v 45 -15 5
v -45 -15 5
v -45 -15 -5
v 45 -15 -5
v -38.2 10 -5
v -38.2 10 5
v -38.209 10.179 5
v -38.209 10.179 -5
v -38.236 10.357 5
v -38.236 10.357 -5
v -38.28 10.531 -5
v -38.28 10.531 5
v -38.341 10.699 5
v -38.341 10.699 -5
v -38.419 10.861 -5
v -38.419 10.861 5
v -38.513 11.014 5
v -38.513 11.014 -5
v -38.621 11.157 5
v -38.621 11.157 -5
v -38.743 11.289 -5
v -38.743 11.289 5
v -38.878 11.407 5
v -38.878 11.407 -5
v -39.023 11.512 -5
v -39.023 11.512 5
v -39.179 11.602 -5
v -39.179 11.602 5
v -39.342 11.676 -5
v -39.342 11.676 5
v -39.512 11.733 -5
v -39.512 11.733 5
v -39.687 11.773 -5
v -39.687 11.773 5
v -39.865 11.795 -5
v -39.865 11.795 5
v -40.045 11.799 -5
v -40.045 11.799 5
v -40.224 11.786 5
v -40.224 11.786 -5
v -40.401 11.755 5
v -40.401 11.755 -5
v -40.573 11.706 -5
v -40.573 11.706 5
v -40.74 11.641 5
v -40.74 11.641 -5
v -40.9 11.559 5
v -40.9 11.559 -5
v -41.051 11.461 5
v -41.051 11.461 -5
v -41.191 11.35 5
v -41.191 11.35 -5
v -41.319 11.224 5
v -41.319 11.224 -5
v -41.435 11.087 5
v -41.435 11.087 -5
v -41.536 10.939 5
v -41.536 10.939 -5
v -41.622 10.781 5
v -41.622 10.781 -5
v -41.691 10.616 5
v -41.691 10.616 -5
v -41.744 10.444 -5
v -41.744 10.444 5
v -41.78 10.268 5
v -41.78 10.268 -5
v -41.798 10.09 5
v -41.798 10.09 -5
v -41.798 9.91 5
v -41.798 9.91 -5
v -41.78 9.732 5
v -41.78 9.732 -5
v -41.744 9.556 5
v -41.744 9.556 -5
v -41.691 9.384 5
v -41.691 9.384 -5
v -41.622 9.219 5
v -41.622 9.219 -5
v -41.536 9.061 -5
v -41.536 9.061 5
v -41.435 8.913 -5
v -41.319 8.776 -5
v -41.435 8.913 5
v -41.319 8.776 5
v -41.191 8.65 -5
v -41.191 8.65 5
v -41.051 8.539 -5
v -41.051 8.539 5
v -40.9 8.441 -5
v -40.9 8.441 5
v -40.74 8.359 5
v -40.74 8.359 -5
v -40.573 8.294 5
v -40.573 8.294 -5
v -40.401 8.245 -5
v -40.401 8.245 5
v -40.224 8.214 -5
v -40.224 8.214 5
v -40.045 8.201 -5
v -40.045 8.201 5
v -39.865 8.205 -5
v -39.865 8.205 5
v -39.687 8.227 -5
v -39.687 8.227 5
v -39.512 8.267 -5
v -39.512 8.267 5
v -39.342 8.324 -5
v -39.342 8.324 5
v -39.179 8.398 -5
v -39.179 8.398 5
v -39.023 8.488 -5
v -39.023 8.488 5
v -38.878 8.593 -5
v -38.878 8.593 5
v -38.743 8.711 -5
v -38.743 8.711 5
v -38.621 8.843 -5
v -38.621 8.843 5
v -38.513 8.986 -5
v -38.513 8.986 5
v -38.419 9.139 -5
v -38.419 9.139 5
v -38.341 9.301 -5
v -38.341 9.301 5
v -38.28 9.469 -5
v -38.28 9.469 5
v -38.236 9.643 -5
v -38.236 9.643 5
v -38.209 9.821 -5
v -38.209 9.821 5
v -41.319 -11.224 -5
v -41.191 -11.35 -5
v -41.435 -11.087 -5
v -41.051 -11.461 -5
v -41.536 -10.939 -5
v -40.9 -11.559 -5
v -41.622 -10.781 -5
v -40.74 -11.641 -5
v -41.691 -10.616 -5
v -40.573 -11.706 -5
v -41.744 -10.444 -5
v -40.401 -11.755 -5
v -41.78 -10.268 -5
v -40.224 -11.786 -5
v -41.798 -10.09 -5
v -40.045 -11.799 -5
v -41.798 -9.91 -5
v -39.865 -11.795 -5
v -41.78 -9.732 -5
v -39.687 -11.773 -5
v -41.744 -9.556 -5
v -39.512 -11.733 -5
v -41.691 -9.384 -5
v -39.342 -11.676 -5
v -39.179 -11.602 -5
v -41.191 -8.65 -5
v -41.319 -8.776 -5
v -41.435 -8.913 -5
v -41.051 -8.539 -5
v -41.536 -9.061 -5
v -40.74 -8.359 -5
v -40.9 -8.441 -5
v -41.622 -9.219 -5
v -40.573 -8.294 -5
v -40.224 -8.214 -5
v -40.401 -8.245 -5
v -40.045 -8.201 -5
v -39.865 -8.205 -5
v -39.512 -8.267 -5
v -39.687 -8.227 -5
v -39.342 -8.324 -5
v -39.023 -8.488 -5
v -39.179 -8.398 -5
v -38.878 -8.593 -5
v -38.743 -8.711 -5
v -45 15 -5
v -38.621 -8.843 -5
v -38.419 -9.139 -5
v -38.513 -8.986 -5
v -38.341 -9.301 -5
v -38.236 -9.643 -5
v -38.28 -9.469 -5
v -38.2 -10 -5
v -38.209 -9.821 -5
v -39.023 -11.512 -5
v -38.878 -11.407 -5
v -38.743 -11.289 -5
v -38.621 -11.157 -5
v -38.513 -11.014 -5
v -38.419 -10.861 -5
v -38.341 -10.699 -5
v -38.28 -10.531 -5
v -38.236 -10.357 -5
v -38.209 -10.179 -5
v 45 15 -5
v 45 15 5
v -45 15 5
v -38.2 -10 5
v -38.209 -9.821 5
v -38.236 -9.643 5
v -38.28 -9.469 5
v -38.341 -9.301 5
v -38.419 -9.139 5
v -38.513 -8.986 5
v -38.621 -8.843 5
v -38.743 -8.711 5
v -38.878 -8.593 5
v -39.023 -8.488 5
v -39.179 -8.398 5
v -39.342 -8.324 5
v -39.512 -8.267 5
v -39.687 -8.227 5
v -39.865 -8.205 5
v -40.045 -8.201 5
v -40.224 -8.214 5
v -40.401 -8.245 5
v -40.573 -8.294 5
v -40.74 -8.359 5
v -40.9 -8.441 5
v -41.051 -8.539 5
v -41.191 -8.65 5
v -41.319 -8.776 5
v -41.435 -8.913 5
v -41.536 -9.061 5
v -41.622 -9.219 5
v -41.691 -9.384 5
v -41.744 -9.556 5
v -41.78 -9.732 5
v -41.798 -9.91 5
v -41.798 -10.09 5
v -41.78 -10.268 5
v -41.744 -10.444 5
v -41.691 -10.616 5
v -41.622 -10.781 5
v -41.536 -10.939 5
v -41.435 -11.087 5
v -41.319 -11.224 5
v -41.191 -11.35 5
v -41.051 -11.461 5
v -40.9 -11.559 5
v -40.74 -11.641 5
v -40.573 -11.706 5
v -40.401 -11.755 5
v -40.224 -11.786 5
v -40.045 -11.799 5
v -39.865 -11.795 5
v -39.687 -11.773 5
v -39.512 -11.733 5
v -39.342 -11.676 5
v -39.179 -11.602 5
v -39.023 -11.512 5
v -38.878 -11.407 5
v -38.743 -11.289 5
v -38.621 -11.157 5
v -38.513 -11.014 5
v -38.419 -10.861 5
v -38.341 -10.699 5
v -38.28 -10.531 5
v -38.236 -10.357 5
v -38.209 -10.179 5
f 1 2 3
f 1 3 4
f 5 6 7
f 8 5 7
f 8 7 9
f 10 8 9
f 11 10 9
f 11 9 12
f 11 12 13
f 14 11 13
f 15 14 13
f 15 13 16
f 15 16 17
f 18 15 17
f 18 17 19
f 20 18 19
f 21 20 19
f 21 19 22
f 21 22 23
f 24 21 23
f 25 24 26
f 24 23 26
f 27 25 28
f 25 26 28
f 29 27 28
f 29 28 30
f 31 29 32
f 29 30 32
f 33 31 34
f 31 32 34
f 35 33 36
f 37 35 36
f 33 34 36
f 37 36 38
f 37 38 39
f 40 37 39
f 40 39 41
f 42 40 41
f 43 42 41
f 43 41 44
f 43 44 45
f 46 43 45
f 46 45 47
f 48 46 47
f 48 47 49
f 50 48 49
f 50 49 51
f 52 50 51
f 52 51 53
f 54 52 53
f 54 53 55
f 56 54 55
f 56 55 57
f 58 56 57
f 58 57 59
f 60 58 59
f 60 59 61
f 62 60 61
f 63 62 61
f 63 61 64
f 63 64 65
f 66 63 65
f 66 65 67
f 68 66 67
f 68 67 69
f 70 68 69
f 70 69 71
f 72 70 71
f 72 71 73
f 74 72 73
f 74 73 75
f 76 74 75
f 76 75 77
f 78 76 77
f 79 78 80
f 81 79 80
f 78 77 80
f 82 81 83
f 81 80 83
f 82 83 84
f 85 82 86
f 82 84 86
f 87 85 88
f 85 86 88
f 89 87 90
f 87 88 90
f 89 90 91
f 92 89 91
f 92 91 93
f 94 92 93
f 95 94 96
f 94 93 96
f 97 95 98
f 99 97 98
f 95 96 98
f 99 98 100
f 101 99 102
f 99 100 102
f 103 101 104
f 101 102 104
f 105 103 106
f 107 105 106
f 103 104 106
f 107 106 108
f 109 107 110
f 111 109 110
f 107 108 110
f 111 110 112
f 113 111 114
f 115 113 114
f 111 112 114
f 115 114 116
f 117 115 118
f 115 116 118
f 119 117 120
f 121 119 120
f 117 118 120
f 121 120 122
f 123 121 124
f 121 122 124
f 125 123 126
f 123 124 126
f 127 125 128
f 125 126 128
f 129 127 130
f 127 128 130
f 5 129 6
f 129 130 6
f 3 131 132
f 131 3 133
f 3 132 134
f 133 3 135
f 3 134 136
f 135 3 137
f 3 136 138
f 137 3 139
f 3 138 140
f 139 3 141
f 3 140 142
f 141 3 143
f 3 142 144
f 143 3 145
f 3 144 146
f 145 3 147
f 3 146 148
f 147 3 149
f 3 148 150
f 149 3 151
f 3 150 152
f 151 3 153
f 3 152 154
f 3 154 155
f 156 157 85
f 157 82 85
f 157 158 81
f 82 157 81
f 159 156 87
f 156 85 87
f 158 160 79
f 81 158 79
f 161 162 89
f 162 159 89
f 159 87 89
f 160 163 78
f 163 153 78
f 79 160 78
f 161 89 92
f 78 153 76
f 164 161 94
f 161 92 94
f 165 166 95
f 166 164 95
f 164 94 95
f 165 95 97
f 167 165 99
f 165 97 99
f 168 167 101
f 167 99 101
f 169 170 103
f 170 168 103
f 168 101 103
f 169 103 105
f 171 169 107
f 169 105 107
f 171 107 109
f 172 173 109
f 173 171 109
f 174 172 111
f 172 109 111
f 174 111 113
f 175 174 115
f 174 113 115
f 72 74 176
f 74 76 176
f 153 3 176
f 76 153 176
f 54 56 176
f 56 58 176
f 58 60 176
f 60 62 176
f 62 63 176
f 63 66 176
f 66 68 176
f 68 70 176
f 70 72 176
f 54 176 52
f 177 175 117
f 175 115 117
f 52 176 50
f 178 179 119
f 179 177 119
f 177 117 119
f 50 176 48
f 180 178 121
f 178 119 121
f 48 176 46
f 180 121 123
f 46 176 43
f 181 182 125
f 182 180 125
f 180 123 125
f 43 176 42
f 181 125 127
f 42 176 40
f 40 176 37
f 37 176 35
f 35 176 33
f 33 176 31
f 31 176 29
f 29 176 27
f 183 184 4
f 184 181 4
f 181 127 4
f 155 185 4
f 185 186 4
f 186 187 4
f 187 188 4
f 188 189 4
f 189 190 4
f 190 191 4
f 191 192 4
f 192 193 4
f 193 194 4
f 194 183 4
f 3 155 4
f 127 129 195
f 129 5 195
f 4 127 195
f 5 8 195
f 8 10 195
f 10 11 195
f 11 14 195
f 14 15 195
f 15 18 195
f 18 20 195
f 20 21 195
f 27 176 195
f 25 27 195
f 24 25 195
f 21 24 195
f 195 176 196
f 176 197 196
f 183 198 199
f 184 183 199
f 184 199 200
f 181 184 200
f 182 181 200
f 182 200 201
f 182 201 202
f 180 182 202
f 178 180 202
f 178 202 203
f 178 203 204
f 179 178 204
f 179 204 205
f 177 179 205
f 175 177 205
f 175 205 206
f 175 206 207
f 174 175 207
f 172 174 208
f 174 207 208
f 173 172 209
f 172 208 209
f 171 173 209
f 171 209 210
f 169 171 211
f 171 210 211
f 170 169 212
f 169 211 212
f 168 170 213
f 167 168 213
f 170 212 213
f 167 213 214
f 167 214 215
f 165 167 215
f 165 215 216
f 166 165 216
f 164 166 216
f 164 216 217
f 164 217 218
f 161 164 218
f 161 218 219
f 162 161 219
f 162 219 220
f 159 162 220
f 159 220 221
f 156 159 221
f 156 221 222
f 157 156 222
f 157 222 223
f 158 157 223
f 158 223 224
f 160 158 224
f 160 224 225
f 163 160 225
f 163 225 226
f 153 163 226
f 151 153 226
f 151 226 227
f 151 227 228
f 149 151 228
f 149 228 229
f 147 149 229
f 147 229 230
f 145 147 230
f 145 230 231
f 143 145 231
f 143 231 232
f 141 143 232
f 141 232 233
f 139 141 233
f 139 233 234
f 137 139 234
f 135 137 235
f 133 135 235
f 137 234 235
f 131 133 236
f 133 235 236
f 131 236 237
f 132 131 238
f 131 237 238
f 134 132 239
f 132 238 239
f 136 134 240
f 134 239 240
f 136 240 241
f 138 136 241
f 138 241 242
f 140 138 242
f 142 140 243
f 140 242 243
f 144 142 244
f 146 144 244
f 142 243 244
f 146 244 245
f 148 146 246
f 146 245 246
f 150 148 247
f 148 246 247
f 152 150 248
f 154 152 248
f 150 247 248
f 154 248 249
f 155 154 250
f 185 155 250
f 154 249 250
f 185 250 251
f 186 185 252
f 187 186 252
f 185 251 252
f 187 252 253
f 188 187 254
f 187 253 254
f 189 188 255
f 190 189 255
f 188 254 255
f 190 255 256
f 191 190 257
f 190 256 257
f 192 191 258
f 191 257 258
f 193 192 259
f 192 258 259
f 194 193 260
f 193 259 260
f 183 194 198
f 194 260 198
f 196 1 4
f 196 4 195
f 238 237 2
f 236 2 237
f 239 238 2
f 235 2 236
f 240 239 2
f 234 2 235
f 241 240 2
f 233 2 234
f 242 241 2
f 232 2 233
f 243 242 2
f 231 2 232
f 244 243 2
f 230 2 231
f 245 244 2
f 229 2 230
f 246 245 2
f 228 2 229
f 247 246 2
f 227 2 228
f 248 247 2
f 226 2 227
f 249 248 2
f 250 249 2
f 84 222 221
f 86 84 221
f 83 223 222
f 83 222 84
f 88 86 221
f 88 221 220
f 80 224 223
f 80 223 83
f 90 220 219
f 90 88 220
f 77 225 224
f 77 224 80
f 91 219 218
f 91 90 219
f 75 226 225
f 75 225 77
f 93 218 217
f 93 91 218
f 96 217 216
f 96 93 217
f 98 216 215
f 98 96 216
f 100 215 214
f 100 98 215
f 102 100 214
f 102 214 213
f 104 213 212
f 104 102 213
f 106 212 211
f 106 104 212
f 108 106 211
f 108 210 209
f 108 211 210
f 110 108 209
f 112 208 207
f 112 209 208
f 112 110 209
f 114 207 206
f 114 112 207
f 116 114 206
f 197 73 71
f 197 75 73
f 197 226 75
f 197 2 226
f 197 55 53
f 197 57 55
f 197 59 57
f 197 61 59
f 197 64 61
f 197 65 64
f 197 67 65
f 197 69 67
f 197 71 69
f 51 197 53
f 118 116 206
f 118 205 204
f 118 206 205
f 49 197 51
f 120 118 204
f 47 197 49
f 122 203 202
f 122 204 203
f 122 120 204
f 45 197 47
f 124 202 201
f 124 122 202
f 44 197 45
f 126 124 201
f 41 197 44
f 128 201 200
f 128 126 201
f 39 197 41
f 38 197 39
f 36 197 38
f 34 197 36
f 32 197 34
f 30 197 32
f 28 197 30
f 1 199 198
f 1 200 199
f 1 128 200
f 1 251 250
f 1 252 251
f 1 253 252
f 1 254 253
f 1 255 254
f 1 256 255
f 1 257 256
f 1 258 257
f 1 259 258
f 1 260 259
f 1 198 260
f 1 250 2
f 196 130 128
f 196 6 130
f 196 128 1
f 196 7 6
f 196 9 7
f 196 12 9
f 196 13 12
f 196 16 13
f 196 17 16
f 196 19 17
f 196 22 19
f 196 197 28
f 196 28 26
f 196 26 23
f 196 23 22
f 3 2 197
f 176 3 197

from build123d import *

# Parameters (mm, degrees)
F0_W     = 90
F0_H     = 30
F1_DEPTH = 5
F2_R     = 1.8
F3_DEPTH = 21
F4_R     = 1.8
F5_DEPTH = 21


with BuildPart() as f1:
    # F0 (on Top) → F1 (new body, symmetric)
    with BuildSketch(Plane.XY):
        Rectangle(F0_W, F0_H)
    extrude(amount=F1_DEPTH, both=True)

    # F2 (on face) → F3 (cut)
    with BuildSketch(Plane.XY.offset(5)):
        with Locations((-40, 10)):
            Circle(F2_R)
    extrude(amount=-F3_DEPTH, mode=Mode.SUBTRACT)

    # F4 (on face) → F5 (cut)
    with BuildSketch(Plane.XY.offset(5)):
        with Locations((-40, -10)):
            Circle(F4_R)
    extrude(amount=-F5_DEPTH, mode=Mode.SUBTRACT)


solid = f1.part
